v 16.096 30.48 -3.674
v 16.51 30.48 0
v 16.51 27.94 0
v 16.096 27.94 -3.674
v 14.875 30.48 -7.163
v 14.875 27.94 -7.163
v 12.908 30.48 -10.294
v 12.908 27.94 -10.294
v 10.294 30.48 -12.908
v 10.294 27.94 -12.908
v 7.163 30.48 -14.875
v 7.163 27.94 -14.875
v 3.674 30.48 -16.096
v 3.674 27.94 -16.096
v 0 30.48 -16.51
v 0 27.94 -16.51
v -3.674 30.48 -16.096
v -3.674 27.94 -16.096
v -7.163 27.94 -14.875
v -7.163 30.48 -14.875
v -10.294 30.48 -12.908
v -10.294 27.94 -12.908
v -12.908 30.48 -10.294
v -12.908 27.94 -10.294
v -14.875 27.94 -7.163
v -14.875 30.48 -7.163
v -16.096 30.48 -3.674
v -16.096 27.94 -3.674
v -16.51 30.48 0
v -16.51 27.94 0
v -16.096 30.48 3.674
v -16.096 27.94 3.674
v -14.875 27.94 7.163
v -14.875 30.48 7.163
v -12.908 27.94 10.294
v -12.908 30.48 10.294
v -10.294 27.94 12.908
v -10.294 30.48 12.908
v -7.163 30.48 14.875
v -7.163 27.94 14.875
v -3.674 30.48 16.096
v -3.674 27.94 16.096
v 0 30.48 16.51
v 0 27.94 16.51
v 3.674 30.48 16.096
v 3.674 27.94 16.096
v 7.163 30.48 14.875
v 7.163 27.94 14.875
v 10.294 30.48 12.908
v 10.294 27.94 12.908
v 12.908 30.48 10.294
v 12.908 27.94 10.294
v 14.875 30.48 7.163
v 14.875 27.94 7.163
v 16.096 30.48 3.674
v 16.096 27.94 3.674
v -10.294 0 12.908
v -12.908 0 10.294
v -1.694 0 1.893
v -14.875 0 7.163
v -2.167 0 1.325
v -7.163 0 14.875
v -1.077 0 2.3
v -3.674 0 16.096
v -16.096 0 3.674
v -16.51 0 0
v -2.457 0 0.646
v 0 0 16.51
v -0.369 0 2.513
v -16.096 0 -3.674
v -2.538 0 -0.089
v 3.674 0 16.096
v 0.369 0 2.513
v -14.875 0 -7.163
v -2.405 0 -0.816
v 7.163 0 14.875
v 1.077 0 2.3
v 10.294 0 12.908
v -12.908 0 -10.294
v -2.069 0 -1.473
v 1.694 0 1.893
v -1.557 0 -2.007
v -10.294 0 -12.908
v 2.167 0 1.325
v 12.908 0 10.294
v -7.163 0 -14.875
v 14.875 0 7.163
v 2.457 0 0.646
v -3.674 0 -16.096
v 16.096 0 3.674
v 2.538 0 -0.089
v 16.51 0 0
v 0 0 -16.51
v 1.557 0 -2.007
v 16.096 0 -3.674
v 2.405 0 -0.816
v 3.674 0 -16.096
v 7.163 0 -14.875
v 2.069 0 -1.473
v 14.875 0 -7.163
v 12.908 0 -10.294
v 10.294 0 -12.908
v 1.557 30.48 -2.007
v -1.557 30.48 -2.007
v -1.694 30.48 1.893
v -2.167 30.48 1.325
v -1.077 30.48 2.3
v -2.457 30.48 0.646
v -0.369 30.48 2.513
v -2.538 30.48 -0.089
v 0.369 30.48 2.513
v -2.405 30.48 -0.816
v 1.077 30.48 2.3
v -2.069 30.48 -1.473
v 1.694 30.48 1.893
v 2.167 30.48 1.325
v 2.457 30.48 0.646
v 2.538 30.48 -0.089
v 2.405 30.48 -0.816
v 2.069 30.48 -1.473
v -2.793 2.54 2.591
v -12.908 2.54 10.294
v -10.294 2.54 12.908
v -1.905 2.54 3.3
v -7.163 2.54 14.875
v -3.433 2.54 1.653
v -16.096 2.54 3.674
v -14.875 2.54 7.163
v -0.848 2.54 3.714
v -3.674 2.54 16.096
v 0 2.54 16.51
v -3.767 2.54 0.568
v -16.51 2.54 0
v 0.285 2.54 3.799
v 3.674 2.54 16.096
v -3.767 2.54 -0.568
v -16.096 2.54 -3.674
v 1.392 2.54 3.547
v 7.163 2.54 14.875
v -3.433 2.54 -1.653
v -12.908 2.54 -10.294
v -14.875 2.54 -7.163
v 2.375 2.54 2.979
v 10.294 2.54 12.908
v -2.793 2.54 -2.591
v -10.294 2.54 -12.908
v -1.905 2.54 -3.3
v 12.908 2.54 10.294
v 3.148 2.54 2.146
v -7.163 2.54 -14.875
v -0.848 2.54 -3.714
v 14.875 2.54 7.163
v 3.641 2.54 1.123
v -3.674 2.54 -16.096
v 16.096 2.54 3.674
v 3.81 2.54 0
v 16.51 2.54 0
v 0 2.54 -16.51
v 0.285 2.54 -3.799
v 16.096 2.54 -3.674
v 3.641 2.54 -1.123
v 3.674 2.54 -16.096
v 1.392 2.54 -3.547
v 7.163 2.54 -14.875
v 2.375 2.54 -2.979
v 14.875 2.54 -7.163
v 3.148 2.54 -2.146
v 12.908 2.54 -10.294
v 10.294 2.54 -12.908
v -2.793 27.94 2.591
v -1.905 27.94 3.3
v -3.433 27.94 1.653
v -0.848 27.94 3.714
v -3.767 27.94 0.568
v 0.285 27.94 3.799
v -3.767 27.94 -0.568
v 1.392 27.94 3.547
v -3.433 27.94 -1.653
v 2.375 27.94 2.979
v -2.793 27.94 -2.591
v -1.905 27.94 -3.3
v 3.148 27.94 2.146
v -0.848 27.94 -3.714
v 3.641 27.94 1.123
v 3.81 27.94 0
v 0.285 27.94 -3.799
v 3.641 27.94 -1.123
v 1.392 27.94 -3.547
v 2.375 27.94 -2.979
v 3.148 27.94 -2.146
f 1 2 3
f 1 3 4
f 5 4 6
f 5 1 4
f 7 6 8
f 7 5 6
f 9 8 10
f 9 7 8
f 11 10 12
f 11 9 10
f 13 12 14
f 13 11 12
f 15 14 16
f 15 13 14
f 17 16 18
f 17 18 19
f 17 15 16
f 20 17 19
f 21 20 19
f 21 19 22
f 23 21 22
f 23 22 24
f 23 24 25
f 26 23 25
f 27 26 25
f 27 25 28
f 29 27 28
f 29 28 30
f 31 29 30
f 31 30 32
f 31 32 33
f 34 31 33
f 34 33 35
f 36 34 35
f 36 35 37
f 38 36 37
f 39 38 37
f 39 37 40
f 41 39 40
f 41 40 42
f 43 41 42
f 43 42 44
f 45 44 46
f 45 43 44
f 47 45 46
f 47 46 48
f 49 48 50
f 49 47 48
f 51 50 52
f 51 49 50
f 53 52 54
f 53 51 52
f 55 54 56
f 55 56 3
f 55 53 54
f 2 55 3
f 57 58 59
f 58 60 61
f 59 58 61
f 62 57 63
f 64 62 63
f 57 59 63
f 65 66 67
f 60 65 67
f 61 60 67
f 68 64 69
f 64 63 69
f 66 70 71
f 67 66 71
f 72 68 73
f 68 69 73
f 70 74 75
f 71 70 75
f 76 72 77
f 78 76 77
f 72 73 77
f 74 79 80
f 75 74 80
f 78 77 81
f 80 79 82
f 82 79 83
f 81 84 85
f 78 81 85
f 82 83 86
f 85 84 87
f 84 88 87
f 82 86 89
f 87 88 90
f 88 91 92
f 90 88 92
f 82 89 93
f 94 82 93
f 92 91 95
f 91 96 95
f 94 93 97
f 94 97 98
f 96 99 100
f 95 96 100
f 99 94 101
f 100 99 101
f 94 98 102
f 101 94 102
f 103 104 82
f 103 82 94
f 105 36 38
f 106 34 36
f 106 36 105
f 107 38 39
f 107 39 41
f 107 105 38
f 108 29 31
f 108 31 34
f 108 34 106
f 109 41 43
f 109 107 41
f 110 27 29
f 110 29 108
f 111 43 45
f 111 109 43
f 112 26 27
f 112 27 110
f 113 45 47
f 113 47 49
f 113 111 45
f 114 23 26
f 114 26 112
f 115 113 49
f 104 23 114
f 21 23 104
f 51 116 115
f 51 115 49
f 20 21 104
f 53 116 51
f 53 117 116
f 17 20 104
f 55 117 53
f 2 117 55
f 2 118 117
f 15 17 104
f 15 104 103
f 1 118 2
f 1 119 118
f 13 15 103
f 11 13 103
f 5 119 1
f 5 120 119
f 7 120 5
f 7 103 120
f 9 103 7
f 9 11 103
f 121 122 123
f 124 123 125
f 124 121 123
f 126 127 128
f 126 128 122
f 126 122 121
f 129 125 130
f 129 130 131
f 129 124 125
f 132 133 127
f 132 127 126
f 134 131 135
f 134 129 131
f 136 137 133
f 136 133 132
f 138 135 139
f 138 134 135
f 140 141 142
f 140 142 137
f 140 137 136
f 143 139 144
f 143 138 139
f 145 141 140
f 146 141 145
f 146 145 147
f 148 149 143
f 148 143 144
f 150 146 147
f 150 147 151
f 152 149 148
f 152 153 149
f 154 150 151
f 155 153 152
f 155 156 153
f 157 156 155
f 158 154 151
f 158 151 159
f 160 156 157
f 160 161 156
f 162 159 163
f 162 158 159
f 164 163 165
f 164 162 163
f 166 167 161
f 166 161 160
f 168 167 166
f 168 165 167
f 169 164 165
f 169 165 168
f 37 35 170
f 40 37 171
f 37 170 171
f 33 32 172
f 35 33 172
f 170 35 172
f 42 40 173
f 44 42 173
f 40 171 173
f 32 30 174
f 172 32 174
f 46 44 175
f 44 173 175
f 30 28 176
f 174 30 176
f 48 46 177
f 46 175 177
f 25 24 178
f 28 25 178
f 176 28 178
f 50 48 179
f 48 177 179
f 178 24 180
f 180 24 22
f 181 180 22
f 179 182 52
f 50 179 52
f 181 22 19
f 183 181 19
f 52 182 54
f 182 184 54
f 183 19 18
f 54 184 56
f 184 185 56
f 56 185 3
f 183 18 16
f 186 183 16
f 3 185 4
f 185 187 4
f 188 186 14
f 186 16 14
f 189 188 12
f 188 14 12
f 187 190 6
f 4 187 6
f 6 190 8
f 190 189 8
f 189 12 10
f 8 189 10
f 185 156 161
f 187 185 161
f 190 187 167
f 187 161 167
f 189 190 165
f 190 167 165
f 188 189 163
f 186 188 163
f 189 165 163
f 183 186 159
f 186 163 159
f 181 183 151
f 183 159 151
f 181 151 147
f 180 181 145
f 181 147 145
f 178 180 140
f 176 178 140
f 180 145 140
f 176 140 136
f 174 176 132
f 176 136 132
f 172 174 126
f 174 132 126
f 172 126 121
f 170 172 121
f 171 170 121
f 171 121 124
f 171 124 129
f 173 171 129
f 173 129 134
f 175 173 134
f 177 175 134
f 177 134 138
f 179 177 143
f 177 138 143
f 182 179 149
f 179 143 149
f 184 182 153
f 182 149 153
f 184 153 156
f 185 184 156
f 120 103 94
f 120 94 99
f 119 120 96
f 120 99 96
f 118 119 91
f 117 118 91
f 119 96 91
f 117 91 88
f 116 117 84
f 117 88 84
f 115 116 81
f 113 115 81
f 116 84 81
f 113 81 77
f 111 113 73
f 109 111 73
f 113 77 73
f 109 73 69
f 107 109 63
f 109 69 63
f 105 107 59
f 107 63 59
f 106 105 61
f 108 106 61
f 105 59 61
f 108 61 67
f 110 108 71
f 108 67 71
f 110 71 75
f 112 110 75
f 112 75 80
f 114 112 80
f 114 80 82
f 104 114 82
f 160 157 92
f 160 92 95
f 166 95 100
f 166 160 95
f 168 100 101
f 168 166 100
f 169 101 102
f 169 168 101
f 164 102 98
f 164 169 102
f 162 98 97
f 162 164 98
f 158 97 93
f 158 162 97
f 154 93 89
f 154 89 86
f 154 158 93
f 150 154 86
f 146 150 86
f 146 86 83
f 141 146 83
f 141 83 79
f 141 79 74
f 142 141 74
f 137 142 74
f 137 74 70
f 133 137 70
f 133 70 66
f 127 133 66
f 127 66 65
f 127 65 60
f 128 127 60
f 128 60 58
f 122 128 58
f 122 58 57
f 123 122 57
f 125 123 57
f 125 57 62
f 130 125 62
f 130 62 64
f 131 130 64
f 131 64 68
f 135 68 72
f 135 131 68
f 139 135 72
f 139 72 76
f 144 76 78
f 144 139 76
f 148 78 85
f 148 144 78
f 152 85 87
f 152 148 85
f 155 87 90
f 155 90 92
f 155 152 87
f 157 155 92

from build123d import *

# Parameters (mm, degrees)
SKETCH1_R           = 33.02
BOSS_EXTRUDE1_DEPTH = 2.54
SKETCH2_R           = 3.81
SKETCH2_R_2         = 2.54
BOSS_EXTRUDE2_DEPTH = 25.4
SKETCH3_R           = 2.54
CUT_EXTRUDE1_DEPTH  = 25.4
SKETCH4_R           = 33.02
BOSS_EXTRUDE3_DEPTH = 2.54
SKETCH5_R           = 2.54
CUT_EXTRUDE2_DEPTH  = 2.54
BOSS_EXTRUDE4_DEPTH = 30.48
SKETCH7_R           = 33.02
SKETCH7_R_2         = 16.51
CUT_EXTRUDE3_DEPTH  = 132.842


with BuildPart() as part:
    # Sketch1 → Boss-Extrude1 (new body)
    with BuildSketch(Plane(origin=(0, 0, 0), x_dir=(1, 0, 0), z_dir=(0, 1, 0))):
        Circle(SKETCH1_R)
    extrude(amount=BOSS_EXTRUDE1_DEPTH)

    # Sketch2 → Boss-Extrude2 (add)
    with BuildSketch(Plane(origin=(0, 2.54, 0), x_dir=(1, 0, 0), z_dir=(0, 1, 0))):
        Circle(SKETCH2_R)
        Circle(SKETCH2_R_2, mode=Mode.SUBTRACT)
    extrude(amount=BOSS_EXTRUDE2_DEPTH)

    # Sketch3 → Cut-Extrude1 (cut)
    with BuildSketch(Plane(origin=(0, 2.54, 0), x_dir=(1, 0, 0), z_dir=(0, 1, 0))):
        Circle(SKETCH3_R)
    extrude(amount=-CUT_EXTRUDE1_DEPTH, mode=Mode.SUBTRACT)

    # Sketch4 → Boss-Extrude3 (add)
    with BuildSketch(Plane(origin=(0, 27.94, 0), x_dir=(1, 0, 0), z_dir=(0, 1, 0))):
        Circle(SKETCH4_R)
    extrude(amount=BOSS_EXTRUDE3_DEPTH)

    # Sketch5 → Cut-Extrude2 (cut)
    with BuildSketch(Plane.XZ.offset(-27.94)):
        Circle(SKETCH5_R)
    extrude(amount=-CUT_EXTRUDE2_DEPTH, mode=Mode.SUBTRACT)

    # Sketch6 → Boss-Extrude4 (add)
    with BuildSketch(Plane(origin=(0, 30.48, 0), x_dir=(1, 0, 0), z_dir=(0, 1, 0))):
        with BuildLine():
            Line((-1.557291379, 2.0066), (0, 2.0066))
            Line((0, 2.0066), (1.557291379, 2.0066))
            ThreePointArc((1.557291379, 2.0066), (0, 2.54), (-1.557291379, 2.0066))
        make_face()
    extrude(amount=-BOSS_EXTRUDE4_DEPTH)

    # Sketch7 → Cut-Extrude3 (cut)
    with BuildSketch(Plane(origin=(0, 30.48, 0), x_dir=(1, 0, 0), z_dir=(0, 1, 0))):
        Circle(SKETCH7_R)
        Circle(SKETCH7_R_2, mode=Mode.SUBTRACT)
    extrude(amount=-CUT_EXTRUDE3_DEPTH, mode=Mode.SUBTRACT)


solid = part.part
